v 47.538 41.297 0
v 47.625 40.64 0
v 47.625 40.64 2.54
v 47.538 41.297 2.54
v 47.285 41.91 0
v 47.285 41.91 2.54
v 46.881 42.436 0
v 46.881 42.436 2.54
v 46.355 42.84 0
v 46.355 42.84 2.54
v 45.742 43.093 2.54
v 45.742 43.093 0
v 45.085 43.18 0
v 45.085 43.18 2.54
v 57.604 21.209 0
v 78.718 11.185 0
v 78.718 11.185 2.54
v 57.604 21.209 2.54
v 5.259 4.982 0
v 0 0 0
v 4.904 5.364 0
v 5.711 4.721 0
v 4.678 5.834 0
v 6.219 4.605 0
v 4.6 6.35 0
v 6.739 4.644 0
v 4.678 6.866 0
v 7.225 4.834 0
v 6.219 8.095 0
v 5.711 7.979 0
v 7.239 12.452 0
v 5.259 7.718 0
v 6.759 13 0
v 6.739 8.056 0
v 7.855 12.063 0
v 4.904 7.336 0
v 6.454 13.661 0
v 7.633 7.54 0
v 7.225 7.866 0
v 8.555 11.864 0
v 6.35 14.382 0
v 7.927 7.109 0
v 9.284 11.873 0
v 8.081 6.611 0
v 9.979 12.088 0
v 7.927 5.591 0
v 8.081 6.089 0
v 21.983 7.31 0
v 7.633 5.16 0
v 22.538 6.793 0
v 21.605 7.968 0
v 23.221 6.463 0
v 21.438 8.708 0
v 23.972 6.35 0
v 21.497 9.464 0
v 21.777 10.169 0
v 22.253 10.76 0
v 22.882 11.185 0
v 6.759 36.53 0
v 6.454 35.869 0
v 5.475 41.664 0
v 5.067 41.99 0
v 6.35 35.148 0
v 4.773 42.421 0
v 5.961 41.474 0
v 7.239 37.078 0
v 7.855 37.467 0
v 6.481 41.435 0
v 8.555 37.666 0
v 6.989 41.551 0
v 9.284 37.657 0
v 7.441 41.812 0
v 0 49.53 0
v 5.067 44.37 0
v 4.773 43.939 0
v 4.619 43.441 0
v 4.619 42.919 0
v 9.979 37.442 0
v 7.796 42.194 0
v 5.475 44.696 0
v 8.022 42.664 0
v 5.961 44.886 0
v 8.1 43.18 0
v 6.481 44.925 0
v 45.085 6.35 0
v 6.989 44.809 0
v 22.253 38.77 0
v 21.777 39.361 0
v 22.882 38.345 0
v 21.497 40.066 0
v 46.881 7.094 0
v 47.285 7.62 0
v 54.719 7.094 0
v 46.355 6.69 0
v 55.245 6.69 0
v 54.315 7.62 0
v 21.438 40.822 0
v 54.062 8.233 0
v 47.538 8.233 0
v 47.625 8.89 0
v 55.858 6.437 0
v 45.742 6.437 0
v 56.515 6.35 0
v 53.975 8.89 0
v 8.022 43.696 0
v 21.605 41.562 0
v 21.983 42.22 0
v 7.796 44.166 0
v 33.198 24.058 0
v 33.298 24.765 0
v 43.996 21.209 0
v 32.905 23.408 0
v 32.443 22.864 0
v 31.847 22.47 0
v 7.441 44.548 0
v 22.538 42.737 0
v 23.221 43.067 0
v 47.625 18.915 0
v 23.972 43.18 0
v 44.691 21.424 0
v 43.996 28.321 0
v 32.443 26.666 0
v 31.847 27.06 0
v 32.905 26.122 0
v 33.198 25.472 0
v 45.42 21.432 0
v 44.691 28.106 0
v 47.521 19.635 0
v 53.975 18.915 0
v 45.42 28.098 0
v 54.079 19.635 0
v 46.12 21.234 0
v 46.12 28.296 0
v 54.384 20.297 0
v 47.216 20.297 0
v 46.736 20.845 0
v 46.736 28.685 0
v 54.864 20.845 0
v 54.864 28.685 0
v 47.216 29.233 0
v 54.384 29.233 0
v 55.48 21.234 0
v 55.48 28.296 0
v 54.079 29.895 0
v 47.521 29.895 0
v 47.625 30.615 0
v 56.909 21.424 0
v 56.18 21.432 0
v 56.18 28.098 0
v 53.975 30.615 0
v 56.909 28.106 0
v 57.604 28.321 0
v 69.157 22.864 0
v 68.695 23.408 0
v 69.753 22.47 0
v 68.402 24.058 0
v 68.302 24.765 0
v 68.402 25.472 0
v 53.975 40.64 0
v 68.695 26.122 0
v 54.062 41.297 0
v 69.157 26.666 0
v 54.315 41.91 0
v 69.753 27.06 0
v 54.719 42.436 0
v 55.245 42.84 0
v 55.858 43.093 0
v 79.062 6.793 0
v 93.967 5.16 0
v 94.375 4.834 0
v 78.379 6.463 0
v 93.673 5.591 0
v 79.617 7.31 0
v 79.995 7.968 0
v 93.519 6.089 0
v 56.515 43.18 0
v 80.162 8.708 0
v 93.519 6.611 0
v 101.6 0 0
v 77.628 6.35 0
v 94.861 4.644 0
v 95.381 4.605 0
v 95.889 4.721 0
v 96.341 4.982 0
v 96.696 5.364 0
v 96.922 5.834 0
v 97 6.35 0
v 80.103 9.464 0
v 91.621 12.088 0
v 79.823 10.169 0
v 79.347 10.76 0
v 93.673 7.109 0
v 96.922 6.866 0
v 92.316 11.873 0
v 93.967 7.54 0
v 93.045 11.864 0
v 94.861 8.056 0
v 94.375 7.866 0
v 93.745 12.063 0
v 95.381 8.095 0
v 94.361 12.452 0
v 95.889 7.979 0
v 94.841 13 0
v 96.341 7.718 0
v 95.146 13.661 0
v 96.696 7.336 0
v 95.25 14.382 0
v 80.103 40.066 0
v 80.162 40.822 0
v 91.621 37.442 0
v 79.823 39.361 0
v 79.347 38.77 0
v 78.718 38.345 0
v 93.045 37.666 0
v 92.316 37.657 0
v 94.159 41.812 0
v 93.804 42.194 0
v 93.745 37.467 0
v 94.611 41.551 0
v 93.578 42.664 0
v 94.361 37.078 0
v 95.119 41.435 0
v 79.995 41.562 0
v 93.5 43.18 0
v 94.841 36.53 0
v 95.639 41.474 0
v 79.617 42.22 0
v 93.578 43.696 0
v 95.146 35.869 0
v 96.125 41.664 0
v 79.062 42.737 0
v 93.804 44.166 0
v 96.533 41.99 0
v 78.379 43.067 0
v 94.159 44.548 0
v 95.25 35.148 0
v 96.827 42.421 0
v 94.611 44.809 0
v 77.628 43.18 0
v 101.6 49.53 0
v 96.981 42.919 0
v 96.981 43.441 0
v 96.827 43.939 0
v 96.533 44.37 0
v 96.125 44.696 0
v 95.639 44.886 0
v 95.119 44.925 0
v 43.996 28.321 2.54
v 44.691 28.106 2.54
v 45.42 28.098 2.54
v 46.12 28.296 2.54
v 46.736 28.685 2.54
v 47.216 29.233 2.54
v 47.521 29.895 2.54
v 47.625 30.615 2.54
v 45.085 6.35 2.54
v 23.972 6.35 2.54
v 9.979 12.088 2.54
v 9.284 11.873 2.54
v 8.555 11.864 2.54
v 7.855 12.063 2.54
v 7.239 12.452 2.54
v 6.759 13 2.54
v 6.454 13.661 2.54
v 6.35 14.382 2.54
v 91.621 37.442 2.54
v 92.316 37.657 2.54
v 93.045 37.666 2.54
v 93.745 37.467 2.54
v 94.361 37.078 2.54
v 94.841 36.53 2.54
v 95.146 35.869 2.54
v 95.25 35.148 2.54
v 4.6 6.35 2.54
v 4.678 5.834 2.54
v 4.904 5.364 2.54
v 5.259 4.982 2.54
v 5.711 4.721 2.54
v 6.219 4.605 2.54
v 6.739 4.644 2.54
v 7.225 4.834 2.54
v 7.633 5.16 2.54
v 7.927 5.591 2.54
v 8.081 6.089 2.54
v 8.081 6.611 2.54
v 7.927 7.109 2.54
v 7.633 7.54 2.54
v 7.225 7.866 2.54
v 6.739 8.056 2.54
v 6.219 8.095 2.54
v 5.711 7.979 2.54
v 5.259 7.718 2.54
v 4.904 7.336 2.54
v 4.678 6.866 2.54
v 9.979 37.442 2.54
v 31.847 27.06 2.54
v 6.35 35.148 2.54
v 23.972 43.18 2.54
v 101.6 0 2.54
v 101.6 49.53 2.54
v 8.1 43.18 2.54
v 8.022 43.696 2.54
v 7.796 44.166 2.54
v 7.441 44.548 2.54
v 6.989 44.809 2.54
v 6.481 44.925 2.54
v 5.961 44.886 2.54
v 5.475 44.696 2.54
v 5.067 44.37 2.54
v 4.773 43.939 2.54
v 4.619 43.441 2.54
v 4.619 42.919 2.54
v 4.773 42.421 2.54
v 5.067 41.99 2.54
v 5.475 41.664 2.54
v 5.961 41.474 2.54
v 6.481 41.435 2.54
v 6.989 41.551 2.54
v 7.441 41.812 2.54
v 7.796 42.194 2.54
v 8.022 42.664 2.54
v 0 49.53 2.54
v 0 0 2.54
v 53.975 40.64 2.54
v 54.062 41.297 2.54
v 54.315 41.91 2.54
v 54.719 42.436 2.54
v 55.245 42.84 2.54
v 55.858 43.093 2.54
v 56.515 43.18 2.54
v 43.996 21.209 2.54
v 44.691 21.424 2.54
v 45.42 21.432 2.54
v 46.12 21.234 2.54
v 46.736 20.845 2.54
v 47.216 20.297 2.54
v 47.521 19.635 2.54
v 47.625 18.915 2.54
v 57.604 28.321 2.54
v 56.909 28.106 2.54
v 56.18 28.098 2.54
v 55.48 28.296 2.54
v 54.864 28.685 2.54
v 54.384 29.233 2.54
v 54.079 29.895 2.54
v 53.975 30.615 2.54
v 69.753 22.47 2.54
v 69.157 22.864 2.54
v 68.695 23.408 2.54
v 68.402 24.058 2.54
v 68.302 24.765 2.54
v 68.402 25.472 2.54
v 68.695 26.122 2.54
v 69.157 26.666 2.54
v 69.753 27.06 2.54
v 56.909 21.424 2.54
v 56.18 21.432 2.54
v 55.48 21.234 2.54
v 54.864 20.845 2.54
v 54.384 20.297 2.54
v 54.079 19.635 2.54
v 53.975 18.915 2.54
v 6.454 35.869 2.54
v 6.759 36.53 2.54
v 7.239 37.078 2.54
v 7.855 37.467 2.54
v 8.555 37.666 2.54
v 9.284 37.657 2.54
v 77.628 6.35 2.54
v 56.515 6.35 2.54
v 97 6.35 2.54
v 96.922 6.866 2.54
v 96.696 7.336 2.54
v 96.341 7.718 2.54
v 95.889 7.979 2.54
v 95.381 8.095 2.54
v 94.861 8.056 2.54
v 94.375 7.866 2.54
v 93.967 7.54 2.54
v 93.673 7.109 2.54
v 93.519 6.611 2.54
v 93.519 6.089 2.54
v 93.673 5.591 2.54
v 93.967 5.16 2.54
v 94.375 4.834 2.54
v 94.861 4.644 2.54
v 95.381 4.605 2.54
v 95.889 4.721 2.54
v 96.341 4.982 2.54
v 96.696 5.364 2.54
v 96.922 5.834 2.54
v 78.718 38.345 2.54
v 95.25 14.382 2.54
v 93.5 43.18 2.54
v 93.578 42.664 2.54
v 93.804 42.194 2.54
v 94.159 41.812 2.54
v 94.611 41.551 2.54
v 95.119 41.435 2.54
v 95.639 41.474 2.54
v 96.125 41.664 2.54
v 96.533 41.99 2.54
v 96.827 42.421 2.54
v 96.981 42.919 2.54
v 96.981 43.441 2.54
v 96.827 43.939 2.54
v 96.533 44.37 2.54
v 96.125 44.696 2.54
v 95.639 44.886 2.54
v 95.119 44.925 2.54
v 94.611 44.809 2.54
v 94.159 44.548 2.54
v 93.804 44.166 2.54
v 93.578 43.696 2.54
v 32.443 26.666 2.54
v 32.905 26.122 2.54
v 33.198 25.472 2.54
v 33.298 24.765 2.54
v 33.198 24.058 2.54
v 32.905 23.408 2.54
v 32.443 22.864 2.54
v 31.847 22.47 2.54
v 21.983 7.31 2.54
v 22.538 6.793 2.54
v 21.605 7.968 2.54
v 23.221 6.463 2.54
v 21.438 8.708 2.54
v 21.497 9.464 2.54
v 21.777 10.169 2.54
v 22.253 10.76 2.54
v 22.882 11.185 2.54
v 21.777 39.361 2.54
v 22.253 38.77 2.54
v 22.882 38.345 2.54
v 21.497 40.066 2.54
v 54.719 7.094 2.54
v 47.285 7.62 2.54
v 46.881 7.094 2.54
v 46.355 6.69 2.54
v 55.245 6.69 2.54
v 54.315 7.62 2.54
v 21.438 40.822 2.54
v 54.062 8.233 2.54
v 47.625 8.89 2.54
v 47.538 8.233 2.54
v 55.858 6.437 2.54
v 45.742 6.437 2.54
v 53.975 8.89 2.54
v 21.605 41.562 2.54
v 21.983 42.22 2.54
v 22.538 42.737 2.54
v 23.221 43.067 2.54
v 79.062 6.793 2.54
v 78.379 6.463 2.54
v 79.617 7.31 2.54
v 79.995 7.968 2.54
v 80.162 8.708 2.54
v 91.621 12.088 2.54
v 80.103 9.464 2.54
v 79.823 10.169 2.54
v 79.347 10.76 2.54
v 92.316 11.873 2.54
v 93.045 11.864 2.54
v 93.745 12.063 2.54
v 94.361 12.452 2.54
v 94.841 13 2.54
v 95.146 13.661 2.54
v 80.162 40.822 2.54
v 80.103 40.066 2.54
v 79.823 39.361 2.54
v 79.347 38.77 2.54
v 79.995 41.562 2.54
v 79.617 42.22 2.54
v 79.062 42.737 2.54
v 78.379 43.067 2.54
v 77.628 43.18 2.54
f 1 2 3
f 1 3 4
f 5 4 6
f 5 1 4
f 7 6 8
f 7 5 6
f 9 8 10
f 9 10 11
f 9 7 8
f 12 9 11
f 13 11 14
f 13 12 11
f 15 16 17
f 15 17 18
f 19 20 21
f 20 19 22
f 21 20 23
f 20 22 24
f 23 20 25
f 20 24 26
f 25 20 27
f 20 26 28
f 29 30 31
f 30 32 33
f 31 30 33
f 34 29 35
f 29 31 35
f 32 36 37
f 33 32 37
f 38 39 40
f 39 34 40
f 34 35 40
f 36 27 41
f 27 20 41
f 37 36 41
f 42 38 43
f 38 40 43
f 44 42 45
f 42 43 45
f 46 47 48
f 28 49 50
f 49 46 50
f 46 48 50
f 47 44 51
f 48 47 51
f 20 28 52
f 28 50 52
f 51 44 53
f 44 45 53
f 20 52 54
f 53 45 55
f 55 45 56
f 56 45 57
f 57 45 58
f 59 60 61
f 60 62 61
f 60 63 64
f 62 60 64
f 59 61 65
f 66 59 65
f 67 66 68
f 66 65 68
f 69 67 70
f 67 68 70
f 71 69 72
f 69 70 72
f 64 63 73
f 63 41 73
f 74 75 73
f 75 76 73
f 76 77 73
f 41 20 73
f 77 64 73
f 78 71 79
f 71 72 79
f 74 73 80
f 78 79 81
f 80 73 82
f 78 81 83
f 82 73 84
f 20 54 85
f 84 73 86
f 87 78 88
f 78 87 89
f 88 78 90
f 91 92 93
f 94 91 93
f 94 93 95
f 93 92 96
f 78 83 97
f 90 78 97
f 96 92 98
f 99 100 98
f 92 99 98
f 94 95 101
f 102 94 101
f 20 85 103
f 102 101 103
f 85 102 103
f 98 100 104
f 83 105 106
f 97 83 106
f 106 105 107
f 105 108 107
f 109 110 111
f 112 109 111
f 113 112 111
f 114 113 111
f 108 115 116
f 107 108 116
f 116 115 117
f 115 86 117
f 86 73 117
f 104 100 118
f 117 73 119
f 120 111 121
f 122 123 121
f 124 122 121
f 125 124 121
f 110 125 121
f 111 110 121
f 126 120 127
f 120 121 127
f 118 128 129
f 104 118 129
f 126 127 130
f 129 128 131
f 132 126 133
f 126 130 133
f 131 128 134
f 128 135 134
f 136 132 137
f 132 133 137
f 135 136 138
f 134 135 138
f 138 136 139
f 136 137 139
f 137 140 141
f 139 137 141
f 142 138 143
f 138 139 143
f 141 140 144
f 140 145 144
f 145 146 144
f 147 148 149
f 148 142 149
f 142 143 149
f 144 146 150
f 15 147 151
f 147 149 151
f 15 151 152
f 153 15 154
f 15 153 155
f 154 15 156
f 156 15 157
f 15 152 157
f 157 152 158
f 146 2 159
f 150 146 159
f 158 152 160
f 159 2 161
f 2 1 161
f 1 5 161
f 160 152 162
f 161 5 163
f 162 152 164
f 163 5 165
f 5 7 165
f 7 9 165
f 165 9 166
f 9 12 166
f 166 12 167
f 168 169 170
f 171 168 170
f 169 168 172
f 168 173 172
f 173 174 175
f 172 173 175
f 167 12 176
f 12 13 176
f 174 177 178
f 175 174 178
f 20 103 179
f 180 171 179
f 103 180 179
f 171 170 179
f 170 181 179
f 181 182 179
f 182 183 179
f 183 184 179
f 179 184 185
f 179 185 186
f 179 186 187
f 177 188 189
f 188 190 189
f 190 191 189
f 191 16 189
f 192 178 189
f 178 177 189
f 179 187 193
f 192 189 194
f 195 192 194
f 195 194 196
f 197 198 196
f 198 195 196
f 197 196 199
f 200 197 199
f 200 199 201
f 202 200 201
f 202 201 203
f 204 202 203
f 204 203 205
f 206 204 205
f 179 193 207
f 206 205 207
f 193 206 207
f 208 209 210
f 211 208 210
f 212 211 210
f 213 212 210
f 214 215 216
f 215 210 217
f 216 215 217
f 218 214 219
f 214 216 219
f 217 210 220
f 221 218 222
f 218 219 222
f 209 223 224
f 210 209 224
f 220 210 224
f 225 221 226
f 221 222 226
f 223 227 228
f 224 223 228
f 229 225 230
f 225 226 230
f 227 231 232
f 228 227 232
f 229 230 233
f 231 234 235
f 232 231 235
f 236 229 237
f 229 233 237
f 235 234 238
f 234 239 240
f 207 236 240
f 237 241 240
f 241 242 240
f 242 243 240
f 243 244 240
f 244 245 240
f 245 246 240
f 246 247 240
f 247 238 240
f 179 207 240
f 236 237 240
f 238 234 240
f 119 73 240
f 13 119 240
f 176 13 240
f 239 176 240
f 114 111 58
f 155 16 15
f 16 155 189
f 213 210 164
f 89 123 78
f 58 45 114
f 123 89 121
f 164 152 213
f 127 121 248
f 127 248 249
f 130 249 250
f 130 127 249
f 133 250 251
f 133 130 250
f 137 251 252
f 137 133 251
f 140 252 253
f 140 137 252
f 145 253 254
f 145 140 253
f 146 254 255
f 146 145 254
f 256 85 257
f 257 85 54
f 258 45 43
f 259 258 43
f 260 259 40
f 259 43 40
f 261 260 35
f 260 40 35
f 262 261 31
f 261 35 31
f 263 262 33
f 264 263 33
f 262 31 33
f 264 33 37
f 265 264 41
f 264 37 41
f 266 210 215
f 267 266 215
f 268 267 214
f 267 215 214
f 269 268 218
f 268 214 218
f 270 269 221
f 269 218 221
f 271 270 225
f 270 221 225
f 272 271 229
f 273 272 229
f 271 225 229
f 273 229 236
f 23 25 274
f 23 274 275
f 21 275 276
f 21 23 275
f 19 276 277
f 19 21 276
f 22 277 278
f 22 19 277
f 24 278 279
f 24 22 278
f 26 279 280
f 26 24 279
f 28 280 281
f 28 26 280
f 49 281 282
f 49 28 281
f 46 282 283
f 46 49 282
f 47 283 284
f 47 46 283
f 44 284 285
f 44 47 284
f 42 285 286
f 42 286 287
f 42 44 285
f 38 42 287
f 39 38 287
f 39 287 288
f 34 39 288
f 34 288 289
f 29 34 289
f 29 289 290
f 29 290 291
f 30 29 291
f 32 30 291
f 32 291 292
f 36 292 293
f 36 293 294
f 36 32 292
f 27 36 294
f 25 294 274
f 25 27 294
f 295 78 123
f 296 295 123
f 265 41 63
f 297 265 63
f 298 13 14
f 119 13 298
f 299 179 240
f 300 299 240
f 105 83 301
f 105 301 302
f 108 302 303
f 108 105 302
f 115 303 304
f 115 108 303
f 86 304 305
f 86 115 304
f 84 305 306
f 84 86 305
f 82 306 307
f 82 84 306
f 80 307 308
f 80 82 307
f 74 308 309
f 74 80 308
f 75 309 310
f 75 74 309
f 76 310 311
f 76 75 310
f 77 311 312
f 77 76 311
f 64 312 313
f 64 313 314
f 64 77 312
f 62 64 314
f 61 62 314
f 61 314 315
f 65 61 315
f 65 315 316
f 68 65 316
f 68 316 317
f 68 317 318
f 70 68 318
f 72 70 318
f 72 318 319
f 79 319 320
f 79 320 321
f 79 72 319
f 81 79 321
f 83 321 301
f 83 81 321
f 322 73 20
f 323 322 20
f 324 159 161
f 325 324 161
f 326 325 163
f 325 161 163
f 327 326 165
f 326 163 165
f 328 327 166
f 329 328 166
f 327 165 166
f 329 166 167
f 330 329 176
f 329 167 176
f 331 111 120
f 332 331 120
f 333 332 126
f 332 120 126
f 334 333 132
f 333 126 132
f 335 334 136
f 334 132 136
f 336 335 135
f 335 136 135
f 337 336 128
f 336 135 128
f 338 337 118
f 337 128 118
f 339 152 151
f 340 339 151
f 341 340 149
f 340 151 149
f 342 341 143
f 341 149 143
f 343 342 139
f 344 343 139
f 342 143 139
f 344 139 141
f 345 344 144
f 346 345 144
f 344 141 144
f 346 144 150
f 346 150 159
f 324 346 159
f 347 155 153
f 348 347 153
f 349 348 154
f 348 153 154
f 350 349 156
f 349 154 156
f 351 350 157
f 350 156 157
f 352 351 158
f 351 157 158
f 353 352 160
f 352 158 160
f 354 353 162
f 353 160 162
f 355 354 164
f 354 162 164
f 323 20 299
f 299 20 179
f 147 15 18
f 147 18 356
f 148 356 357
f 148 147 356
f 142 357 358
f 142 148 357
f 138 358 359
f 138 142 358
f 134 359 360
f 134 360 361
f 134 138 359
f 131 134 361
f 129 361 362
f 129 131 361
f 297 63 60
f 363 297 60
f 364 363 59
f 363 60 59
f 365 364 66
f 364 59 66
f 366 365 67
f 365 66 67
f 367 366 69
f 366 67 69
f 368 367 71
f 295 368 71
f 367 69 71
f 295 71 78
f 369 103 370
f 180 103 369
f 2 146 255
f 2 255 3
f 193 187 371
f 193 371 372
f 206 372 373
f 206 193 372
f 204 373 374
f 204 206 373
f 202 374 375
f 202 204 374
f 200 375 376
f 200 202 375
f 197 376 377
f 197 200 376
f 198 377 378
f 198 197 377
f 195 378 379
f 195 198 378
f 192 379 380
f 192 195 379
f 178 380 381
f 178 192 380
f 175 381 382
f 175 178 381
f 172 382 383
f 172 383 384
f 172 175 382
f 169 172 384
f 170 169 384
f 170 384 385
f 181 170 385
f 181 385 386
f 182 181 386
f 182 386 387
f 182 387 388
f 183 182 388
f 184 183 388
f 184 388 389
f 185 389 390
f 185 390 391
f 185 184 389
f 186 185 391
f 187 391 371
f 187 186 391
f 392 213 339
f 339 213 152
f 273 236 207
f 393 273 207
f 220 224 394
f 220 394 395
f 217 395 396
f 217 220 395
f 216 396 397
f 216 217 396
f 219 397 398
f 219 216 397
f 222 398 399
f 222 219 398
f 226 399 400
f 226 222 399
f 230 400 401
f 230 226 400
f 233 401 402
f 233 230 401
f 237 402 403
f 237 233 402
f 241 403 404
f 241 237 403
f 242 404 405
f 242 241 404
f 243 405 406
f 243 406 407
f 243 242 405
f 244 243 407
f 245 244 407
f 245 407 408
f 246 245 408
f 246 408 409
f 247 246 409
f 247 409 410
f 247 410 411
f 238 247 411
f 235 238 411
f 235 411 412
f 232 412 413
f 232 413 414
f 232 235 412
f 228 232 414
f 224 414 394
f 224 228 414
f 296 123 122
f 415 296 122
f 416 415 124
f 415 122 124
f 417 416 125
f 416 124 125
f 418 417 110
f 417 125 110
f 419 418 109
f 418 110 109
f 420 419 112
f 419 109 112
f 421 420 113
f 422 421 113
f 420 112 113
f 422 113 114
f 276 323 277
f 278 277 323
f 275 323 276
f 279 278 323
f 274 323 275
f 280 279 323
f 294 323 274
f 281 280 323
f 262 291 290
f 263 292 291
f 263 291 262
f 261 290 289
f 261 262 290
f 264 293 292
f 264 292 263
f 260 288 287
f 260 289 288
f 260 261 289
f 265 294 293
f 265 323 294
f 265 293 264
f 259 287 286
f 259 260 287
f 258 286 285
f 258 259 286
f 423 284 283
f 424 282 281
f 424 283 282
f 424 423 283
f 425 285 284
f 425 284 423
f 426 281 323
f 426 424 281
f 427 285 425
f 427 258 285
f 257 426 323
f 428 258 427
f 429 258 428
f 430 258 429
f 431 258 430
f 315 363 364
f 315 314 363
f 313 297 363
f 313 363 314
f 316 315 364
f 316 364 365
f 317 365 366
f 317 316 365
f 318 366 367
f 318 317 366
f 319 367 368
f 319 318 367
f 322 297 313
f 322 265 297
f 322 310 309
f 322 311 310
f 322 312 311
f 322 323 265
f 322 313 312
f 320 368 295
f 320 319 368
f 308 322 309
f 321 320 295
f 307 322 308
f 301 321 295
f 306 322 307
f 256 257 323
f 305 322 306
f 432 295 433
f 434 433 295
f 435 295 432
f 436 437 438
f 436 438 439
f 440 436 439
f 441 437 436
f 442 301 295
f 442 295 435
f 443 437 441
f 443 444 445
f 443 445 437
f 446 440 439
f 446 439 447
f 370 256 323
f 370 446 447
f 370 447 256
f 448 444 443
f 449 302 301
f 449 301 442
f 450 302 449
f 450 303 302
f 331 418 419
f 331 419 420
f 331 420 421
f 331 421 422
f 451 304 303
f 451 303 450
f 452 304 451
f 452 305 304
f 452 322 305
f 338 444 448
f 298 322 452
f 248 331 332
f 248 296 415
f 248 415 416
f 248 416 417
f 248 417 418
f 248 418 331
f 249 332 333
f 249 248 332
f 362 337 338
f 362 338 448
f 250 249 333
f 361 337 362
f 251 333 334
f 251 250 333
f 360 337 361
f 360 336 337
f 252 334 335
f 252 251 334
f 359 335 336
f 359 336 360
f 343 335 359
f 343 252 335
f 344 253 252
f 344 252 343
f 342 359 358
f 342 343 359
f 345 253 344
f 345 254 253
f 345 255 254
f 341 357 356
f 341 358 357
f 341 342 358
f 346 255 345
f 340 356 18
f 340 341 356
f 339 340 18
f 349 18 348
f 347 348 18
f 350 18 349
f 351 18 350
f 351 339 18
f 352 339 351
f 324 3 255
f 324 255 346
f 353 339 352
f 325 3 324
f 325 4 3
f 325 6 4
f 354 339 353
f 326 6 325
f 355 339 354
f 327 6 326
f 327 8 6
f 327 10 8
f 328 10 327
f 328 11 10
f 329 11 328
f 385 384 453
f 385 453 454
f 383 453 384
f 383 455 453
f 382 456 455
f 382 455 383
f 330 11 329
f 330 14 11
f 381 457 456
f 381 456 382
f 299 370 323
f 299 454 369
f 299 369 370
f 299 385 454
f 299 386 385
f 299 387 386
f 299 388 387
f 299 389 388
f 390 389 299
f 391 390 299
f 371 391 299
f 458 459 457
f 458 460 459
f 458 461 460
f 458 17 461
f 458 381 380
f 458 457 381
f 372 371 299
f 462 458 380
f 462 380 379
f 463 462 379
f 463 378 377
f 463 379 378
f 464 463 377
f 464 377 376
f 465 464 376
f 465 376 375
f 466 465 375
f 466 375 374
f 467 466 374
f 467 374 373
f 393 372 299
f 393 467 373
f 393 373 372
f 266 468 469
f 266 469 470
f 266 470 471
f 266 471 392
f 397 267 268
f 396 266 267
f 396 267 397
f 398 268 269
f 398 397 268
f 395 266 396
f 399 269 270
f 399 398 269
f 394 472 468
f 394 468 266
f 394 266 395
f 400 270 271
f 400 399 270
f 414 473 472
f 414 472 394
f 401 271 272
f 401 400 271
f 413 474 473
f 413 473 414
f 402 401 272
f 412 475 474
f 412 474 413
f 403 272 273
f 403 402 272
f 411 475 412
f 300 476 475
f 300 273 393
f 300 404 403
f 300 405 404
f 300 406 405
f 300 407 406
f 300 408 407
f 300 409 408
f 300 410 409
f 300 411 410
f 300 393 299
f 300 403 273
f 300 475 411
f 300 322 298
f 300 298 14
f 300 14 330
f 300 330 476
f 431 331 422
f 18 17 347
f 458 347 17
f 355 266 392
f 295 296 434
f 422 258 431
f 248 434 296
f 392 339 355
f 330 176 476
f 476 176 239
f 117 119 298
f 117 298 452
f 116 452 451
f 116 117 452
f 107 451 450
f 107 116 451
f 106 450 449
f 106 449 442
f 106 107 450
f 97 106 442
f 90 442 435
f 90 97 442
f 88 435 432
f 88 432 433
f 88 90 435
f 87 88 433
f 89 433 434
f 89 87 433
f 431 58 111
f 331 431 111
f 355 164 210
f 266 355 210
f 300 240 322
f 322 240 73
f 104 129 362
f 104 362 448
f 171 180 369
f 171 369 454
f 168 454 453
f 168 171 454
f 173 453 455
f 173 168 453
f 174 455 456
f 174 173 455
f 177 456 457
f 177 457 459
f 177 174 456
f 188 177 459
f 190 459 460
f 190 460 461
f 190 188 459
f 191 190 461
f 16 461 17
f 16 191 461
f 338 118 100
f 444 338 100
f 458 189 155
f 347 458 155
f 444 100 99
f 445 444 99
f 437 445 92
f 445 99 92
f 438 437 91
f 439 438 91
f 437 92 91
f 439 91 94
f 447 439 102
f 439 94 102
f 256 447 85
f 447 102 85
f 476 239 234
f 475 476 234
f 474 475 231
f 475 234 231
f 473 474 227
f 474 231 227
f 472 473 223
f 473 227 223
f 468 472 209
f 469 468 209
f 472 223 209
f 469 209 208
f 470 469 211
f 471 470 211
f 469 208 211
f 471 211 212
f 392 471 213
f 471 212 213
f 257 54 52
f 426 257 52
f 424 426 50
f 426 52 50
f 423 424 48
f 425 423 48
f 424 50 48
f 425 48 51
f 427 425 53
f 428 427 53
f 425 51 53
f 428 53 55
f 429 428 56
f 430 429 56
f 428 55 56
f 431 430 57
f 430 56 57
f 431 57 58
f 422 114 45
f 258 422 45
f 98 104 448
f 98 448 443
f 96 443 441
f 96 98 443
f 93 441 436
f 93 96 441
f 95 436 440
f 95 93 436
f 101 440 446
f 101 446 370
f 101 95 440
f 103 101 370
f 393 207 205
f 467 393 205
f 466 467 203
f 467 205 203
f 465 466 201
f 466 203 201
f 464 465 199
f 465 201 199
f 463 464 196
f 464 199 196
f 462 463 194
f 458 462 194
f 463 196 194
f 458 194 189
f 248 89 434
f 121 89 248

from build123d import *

# Parameters (mm, degrees)
SKETCH1_R           = 1.75006
SKETCH1_R_2         = 1.750059992
BOSS_EXTRUDE1_DEPTH = 2.54


with BuildPart() as part:
    # Sketch1 → Boss-Extrude1 (new body)
    with BuildSketch(Plane.XY):
        Polygon((2.54, 0), (99.06, 0), (101.6, 0), (101.6, 2.54), (101.6, 46.99), (101.6, 49.53), (99.06, 49.53), (2.54, 49.53), (0, 49.53), (0, 46.99), (0, 2.54), (0, 0), align=None)
        with Locations((6.35, 43.18)):
            Circle(SKETCH1_R, mode=Mode.SUBTRACT)
        with Locations(Location((6.35, 6.35, 0), (0, 0, 180))):
            Circle(SKETCH1_R, mode=Mode.SUBTRACT)
        with Locations((95.25, 6.35)):
            Circle(SKETCH1_R, mode=Mode.SUBTRACT)
        with Locations(Location((95.25, 43.18, 0), (0, 0, 180))):
            Circle(SKETCH1_R_2, mode=Mode.SUBTRACT)
        with BuildLine():
            Line((22.882222071, 38.345496006), (43.995572894, 28.320908231))
            ThreePointArc((43.995572894, 28.320908231), (46.442286843, 28.46846732), (47.625, 30.615412225))
            Line((47.625, 30.615412225), (47.625, 40.64))
            ThreePointArc((47.625, 40.64), (46.881051224, 42.436051224), (45.085, 43.18))
            Line((45.085, 43.18), (23.971649177, 43.18))
            ThreePointArc((23.971649177, 43.18), (21.493783145, 41.19837257), (22.882222071, 38.345496006))
        make_face(mode=Mode.SUBTRACT)
        with BuildLine():
            Line((47.625, 18.914587775), (47.625, 8.89))
            ThreePointArc((47.625, 8.89), (46.881051224, 7.093948776), (45.085, 6.35))
            Line((45.085, 6.35), (23.971649177, 6.35))
            ThreePointArc((23.971649177, 6.35), (21.493783145, 8.33162743), (22.882222071, 11.184503994))
            Line((22.882222071, 11.184503994), (43.995572894, 21.209091769))
            ThreePointArc((43.995572894, 21.209091769), (46.442286843, 21.06153268), (47.625, 18.914587775))
        make_face(mode=Mode.SUBTRACT)
        with BuildLine():
            Line((78.717777929, 11.184503994), (57.604427106, 21.209091769))
            ThreePointArc((57.604427106, 21.209091769), (55.157713157, 21.06153268), (53.975, 18.914587775))
            Line((53.975, 18.914587775), (53.975, 8.89))
            ThreePointArc((53.975, 8.89), (54.718948776, 7.093948776), (56.515, 6.35))
            Line((56.515, 6.35), (77.628350823, 6.35))
            ThreePointArc((77.628350823, 6.35), (80.106216855, 8.33162743), (78.717777929, 11.184503994))
        make_face(mode=Mode.SUBTRACT)
        with BuildLine():
            Line((53.975, 30.615412225), (53.975, 40.64))
            ThreePointArc((53.975, 40.64), (54.718948776, 42.436051224), (56.515, 43.18))
            Line((56.515, 43.18), (77.628350823, 43.18))
            ThreePointArc((77.628350823, 43.18), (80.106216855, 41.19837257), (78.717777929, 38.345496006))
            Line((78.717777929, 38.345496006), (57.604427106, 28.320908231))
            ThreePointArc((57.604427106, 28.320908231), (55.157713157, 28.46846732), (53.975, 30.615412225))
        make_face(mode=Mode.SUBTRACT)
        with BuildLine():
            Line((9.979427106, 37.442318053), (31.847258551, 27.059503994))
            ThreePointArc((31.847258551, 27.059503994), (33.297831444, 24.765), (31.847258551, 22.470496006))
            Line((31.847258551, 22.470496006), (9.979427106, 12.087681947))
            ThreePointArc((9.979427106, 12.087681947), (7.532713157, 12.235241036), (6.35, 14.382185941))
            Line((6.35, 14.382185941), (6.35, 35.147814059))
            ThreePointArc((6.35, 35.147814059), (7.532713157, 37.294758964), (9.979427106, 37.442318053))
        make_face(mode=Mode.SUBTRACT)
        with BuildLine():
            Line((91.620572894, 12.087681947), (69.752741449, 22.470496006))
            ThreePointArc((69.752741449, 22.470496006), (68.302168556, 24.765), (69.752741449, 27.059503994))
            Line((69.752741449, 27.059503994), (91.620572894, 37.442318053))
            ThreePointArc((91.620572894, 37.442318053), (94.067286843, 37.294758964), (95.25, 35.147814059))
            Line((95.25, 35.147814059), (95.25, 14.382185941))
            ThreePointArc((95.25, 14.382185941), (94.067286843, 12.235241036), (91.620572894, 12.087681947))
        make_face(mode=Mode.SUBTRACT)
    extrude(amount=BOSS_EXTRUDE1_DEPTH)


solid = part.part
